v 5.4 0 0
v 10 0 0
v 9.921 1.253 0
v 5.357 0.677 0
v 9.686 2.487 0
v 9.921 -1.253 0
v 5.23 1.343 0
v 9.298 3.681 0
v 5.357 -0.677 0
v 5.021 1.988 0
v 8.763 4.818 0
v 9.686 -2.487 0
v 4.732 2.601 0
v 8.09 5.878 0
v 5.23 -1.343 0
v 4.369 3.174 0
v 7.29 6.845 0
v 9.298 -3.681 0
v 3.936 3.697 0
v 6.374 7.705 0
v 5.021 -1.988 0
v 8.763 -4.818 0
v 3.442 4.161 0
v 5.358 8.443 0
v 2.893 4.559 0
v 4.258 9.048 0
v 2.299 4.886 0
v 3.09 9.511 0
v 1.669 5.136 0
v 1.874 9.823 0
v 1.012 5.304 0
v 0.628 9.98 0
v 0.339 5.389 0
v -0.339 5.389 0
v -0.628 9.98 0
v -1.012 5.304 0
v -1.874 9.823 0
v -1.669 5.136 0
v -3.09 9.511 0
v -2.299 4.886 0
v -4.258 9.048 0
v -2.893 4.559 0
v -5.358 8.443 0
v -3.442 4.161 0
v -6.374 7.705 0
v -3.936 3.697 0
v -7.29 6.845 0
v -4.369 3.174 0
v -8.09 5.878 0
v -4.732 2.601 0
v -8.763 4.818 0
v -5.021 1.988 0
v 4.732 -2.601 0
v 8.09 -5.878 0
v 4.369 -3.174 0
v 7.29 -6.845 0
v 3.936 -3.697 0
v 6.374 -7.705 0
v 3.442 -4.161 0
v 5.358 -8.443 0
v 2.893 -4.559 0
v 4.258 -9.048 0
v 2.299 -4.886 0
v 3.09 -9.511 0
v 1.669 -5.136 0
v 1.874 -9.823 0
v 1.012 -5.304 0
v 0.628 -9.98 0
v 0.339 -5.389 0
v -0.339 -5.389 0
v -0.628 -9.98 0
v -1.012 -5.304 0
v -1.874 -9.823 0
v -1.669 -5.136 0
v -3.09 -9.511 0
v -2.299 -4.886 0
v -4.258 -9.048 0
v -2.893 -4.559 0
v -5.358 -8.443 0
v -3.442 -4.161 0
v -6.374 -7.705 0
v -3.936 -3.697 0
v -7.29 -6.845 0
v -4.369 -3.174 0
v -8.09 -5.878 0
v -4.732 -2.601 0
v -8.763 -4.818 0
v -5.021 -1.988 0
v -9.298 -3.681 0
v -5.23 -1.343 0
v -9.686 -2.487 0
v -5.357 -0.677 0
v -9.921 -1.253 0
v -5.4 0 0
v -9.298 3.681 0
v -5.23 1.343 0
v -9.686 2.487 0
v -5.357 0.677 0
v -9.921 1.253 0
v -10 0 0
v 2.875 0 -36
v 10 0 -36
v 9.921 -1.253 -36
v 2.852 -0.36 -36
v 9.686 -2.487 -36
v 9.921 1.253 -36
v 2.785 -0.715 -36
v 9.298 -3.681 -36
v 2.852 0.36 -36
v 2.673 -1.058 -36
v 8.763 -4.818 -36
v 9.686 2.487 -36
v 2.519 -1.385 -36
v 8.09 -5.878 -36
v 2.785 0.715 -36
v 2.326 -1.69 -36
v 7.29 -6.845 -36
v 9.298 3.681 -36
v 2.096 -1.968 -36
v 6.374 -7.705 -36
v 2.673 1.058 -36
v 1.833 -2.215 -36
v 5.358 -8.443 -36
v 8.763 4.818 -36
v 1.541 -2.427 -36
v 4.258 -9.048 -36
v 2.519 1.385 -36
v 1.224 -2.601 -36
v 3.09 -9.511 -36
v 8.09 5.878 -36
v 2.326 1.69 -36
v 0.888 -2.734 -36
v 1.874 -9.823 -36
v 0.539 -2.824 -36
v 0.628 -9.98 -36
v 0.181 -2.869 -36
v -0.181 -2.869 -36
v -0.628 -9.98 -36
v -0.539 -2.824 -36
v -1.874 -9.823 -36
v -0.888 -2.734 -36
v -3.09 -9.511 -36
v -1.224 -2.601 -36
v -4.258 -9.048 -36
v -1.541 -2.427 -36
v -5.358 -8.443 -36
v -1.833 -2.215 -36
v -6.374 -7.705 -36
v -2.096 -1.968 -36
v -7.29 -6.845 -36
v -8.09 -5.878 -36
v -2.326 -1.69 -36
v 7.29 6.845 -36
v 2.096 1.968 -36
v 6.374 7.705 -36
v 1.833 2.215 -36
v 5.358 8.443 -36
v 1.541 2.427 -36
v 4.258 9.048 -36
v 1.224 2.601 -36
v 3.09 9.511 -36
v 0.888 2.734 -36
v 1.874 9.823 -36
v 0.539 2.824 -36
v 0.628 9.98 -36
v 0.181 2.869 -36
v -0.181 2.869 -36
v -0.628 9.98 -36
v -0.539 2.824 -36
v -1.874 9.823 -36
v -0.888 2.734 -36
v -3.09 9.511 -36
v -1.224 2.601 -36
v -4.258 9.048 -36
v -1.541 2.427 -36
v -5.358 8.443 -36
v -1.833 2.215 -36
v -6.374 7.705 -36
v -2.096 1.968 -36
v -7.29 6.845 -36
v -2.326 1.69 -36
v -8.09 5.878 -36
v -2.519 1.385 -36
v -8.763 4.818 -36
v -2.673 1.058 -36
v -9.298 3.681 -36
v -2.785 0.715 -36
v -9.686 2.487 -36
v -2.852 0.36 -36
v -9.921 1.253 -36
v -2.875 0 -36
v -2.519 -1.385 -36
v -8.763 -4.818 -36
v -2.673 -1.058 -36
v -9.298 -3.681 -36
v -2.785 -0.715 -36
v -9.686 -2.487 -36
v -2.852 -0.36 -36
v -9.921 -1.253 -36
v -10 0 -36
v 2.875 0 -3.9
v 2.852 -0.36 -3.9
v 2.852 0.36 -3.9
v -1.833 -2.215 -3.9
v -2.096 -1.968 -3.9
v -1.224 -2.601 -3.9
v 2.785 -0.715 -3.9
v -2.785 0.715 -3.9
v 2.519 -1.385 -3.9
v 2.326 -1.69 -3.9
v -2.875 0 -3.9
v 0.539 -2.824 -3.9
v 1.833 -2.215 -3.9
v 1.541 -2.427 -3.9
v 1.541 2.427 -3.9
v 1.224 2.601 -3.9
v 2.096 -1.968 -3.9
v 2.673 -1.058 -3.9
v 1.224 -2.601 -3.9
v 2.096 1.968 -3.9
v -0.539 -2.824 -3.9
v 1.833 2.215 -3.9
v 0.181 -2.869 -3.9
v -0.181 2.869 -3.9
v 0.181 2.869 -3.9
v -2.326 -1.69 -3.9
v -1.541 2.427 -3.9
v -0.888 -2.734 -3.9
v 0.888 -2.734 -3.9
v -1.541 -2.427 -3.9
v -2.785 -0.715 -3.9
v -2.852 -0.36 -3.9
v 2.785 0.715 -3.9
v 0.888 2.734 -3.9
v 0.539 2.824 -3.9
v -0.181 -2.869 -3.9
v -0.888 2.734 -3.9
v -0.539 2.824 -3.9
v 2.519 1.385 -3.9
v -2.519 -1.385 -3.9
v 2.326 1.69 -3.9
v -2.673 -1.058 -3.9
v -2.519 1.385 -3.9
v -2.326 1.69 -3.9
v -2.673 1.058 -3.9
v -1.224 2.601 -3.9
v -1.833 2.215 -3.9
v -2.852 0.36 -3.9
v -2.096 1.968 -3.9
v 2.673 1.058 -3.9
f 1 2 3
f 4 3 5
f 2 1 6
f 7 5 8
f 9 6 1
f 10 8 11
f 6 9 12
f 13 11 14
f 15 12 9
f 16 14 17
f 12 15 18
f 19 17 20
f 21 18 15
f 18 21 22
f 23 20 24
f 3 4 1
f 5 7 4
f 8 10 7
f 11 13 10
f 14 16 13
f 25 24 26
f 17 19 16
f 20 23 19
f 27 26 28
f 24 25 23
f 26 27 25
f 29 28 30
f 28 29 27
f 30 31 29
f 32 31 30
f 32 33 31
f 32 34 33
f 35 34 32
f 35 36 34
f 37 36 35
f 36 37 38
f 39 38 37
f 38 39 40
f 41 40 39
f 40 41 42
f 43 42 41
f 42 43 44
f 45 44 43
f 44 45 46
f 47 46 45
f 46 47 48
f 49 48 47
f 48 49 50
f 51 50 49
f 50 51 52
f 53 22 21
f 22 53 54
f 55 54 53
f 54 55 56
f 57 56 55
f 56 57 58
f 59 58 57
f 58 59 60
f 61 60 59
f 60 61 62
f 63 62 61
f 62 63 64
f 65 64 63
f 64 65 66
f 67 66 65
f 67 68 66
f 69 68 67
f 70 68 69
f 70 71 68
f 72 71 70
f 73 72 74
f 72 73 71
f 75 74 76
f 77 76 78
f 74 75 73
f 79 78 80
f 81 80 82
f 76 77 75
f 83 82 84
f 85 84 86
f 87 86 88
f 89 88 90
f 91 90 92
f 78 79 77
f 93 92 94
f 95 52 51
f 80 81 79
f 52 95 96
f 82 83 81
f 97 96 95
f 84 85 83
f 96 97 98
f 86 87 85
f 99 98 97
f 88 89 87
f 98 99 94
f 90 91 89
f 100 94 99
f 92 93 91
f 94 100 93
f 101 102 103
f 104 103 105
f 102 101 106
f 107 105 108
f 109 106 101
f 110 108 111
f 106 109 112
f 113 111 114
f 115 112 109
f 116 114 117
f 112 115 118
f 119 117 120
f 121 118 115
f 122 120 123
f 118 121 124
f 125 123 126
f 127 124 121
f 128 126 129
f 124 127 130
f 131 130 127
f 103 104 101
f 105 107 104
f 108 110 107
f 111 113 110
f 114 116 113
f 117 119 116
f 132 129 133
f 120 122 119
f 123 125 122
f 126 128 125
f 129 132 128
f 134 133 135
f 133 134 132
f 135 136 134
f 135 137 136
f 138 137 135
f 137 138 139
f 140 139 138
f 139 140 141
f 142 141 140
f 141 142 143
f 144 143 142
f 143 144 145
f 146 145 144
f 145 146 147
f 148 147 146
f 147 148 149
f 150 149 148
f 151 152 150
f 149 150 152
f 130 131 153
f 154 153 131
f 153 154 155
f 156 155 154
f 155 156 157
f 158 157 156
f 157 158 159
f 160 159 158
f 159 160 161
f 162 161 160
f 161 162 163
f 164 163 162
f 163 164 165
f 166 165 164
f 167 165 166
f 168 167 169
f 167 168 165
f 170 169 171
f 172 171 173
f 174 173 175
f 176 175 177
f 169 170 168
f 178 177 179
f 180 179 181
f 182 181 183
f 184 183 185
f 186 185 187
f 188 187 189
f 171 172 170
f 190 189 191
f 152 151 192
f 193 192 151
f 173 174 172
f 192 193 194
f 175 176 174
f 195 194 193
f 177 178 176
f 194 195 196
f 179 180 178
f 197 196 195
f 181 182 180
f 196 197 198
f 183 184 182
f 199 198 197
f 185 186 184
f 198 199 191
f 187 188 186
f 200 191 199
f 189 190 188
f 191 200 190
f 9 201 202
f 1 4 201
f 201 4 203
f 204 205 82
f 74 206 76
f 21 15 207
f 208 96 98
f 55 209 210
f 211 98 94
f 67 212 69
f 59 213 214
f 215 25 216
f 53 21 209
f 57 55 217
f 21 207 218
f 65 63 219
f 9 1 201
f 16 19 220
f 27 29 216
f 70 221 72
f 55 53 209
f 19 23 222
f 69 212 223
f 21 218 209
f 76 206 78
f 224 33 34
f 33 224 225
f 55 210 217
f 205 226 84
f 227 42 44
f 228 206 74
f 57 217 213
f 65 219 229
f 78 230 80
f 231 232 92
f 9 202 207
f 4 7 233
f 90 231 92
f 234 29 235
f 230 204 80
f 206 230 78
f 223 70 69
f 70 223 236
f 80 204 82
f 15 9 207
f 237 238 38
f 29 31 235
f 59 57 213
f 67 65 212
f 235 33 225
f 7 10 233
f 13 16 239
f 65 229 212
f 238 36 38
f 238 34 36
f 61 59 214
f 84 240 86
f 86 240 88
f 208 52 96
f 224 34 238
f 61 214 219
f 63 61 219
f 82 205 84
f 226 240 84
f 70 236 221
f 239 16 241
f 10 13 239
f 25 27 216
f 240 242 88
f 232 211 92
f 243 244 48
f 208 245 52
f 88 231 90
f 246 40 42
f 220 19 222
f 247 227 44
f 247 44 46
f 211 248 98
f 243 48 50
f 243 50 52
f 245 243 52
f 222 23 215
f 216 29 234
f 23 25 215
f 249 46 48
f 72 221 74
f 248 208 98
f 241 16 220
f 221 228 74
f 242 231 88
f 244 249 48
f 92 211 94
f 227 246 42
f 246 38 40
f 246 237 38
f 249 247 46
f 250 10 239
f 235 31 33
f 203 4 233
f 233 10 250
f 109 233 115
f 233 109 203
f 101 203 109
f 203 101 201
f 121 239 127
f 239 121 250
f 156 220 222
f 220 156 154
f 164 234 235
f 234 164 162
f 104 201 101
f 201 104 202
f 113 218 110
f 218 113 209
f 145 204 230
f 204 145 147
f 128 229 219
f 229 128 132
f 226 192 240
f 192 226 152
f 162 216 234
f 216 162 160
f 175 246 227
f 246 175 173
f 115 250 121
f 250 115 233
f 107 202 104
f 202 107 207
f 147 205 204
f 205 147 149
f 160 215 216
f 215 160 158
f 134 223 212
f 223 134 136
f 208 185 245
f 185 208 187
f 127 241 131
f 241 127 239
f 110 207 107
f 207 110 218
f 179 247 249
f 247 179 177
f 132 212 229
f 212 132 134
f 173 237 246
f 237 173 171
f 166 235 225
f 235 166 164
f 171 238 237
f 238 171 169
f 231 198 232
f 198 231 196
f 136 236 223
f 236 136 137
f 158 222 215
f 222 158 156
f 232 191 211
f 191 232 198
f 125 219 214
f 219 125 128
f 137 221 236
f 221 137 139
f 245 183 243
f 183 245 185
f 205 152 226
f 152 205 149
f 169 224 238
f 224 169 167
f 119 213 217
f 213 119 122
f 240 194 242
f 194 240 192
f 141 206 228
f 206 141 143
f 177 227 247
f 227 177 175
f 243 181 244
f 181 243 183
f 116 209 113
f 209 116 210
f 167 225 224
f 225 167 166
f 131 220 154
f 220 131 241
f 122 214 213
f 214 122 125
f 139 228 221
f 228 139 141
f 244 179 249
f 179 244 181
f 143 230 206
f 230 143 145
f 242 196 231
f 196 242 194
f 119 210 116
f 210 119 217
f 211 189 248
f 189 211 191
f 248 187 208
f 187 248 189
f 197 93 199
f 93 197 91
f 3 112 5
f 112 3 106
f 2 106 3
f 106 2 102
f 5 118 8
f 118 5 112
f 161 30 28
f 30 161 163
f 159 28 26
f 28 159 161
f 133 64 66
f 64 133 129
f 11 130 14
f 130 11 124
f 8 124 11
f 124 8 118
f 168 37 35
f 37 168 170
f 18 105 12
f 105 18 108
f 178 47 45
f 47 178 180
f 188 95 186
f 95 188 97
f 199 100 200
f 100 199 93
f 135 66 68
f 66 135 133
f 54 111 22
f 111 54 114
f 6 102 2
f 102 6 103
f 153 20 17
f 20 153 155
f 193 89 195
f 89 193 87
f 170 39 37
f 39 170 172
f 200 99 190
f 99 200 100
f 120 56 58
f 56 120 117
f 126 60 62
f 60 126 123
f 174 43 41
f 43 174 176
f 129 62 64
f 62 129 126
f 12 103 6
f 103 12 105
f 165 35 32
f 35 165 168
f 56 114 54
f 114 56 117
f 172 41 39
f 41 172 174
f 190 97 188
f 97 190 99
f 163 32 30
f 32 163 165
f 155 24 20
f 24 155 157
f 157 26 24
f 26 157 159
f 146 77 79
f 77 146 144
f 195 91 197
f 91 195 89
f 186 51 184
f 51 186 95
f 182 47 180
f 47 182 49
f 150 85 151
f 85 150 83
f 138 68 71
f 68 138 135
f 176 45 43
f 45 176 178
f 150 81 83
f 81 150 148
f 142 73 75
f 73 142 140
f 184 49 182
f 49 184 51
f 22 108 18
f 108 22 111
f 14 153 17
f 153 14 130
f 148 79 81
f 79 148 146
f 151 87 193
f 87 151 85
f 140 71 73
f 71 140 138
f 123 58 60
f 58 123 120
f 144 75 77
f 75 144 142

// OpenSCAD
$fn = 50;


difference() {
	union() {
		translate(v = [0, 0, -36.0000000000]) {
			cylinder(h = 36, r = 10.0000000000);
		}
	}
	union() {
		translate(v = [0, 0, 0]) {
			rotate(a = [0, 0, 0]) {
				difference() {
					union() {
						#translate(v = [0, 0, -36.0000000000]) {
							cylinder(h = 36, r = 2.6000000000);
						}
						#translate(v = [0, 0, -3.9000000000]) {
							cylinder(h = 3.9000000000, r = 10.0000000000, r1 = 2.8750000000, r2 = 5.4000000000);
						}
						#translate(v = [0, 0, -36.0000000000]) {
							cylinder(h = 36, r = 2.8750000000);
						}
						#translate(v = [0, 0, -36.0000000000]) {
							cylinder(h = 36, r = 2.6000000000);
						}
					}
					union();
				}
			}
		}
	}
}
